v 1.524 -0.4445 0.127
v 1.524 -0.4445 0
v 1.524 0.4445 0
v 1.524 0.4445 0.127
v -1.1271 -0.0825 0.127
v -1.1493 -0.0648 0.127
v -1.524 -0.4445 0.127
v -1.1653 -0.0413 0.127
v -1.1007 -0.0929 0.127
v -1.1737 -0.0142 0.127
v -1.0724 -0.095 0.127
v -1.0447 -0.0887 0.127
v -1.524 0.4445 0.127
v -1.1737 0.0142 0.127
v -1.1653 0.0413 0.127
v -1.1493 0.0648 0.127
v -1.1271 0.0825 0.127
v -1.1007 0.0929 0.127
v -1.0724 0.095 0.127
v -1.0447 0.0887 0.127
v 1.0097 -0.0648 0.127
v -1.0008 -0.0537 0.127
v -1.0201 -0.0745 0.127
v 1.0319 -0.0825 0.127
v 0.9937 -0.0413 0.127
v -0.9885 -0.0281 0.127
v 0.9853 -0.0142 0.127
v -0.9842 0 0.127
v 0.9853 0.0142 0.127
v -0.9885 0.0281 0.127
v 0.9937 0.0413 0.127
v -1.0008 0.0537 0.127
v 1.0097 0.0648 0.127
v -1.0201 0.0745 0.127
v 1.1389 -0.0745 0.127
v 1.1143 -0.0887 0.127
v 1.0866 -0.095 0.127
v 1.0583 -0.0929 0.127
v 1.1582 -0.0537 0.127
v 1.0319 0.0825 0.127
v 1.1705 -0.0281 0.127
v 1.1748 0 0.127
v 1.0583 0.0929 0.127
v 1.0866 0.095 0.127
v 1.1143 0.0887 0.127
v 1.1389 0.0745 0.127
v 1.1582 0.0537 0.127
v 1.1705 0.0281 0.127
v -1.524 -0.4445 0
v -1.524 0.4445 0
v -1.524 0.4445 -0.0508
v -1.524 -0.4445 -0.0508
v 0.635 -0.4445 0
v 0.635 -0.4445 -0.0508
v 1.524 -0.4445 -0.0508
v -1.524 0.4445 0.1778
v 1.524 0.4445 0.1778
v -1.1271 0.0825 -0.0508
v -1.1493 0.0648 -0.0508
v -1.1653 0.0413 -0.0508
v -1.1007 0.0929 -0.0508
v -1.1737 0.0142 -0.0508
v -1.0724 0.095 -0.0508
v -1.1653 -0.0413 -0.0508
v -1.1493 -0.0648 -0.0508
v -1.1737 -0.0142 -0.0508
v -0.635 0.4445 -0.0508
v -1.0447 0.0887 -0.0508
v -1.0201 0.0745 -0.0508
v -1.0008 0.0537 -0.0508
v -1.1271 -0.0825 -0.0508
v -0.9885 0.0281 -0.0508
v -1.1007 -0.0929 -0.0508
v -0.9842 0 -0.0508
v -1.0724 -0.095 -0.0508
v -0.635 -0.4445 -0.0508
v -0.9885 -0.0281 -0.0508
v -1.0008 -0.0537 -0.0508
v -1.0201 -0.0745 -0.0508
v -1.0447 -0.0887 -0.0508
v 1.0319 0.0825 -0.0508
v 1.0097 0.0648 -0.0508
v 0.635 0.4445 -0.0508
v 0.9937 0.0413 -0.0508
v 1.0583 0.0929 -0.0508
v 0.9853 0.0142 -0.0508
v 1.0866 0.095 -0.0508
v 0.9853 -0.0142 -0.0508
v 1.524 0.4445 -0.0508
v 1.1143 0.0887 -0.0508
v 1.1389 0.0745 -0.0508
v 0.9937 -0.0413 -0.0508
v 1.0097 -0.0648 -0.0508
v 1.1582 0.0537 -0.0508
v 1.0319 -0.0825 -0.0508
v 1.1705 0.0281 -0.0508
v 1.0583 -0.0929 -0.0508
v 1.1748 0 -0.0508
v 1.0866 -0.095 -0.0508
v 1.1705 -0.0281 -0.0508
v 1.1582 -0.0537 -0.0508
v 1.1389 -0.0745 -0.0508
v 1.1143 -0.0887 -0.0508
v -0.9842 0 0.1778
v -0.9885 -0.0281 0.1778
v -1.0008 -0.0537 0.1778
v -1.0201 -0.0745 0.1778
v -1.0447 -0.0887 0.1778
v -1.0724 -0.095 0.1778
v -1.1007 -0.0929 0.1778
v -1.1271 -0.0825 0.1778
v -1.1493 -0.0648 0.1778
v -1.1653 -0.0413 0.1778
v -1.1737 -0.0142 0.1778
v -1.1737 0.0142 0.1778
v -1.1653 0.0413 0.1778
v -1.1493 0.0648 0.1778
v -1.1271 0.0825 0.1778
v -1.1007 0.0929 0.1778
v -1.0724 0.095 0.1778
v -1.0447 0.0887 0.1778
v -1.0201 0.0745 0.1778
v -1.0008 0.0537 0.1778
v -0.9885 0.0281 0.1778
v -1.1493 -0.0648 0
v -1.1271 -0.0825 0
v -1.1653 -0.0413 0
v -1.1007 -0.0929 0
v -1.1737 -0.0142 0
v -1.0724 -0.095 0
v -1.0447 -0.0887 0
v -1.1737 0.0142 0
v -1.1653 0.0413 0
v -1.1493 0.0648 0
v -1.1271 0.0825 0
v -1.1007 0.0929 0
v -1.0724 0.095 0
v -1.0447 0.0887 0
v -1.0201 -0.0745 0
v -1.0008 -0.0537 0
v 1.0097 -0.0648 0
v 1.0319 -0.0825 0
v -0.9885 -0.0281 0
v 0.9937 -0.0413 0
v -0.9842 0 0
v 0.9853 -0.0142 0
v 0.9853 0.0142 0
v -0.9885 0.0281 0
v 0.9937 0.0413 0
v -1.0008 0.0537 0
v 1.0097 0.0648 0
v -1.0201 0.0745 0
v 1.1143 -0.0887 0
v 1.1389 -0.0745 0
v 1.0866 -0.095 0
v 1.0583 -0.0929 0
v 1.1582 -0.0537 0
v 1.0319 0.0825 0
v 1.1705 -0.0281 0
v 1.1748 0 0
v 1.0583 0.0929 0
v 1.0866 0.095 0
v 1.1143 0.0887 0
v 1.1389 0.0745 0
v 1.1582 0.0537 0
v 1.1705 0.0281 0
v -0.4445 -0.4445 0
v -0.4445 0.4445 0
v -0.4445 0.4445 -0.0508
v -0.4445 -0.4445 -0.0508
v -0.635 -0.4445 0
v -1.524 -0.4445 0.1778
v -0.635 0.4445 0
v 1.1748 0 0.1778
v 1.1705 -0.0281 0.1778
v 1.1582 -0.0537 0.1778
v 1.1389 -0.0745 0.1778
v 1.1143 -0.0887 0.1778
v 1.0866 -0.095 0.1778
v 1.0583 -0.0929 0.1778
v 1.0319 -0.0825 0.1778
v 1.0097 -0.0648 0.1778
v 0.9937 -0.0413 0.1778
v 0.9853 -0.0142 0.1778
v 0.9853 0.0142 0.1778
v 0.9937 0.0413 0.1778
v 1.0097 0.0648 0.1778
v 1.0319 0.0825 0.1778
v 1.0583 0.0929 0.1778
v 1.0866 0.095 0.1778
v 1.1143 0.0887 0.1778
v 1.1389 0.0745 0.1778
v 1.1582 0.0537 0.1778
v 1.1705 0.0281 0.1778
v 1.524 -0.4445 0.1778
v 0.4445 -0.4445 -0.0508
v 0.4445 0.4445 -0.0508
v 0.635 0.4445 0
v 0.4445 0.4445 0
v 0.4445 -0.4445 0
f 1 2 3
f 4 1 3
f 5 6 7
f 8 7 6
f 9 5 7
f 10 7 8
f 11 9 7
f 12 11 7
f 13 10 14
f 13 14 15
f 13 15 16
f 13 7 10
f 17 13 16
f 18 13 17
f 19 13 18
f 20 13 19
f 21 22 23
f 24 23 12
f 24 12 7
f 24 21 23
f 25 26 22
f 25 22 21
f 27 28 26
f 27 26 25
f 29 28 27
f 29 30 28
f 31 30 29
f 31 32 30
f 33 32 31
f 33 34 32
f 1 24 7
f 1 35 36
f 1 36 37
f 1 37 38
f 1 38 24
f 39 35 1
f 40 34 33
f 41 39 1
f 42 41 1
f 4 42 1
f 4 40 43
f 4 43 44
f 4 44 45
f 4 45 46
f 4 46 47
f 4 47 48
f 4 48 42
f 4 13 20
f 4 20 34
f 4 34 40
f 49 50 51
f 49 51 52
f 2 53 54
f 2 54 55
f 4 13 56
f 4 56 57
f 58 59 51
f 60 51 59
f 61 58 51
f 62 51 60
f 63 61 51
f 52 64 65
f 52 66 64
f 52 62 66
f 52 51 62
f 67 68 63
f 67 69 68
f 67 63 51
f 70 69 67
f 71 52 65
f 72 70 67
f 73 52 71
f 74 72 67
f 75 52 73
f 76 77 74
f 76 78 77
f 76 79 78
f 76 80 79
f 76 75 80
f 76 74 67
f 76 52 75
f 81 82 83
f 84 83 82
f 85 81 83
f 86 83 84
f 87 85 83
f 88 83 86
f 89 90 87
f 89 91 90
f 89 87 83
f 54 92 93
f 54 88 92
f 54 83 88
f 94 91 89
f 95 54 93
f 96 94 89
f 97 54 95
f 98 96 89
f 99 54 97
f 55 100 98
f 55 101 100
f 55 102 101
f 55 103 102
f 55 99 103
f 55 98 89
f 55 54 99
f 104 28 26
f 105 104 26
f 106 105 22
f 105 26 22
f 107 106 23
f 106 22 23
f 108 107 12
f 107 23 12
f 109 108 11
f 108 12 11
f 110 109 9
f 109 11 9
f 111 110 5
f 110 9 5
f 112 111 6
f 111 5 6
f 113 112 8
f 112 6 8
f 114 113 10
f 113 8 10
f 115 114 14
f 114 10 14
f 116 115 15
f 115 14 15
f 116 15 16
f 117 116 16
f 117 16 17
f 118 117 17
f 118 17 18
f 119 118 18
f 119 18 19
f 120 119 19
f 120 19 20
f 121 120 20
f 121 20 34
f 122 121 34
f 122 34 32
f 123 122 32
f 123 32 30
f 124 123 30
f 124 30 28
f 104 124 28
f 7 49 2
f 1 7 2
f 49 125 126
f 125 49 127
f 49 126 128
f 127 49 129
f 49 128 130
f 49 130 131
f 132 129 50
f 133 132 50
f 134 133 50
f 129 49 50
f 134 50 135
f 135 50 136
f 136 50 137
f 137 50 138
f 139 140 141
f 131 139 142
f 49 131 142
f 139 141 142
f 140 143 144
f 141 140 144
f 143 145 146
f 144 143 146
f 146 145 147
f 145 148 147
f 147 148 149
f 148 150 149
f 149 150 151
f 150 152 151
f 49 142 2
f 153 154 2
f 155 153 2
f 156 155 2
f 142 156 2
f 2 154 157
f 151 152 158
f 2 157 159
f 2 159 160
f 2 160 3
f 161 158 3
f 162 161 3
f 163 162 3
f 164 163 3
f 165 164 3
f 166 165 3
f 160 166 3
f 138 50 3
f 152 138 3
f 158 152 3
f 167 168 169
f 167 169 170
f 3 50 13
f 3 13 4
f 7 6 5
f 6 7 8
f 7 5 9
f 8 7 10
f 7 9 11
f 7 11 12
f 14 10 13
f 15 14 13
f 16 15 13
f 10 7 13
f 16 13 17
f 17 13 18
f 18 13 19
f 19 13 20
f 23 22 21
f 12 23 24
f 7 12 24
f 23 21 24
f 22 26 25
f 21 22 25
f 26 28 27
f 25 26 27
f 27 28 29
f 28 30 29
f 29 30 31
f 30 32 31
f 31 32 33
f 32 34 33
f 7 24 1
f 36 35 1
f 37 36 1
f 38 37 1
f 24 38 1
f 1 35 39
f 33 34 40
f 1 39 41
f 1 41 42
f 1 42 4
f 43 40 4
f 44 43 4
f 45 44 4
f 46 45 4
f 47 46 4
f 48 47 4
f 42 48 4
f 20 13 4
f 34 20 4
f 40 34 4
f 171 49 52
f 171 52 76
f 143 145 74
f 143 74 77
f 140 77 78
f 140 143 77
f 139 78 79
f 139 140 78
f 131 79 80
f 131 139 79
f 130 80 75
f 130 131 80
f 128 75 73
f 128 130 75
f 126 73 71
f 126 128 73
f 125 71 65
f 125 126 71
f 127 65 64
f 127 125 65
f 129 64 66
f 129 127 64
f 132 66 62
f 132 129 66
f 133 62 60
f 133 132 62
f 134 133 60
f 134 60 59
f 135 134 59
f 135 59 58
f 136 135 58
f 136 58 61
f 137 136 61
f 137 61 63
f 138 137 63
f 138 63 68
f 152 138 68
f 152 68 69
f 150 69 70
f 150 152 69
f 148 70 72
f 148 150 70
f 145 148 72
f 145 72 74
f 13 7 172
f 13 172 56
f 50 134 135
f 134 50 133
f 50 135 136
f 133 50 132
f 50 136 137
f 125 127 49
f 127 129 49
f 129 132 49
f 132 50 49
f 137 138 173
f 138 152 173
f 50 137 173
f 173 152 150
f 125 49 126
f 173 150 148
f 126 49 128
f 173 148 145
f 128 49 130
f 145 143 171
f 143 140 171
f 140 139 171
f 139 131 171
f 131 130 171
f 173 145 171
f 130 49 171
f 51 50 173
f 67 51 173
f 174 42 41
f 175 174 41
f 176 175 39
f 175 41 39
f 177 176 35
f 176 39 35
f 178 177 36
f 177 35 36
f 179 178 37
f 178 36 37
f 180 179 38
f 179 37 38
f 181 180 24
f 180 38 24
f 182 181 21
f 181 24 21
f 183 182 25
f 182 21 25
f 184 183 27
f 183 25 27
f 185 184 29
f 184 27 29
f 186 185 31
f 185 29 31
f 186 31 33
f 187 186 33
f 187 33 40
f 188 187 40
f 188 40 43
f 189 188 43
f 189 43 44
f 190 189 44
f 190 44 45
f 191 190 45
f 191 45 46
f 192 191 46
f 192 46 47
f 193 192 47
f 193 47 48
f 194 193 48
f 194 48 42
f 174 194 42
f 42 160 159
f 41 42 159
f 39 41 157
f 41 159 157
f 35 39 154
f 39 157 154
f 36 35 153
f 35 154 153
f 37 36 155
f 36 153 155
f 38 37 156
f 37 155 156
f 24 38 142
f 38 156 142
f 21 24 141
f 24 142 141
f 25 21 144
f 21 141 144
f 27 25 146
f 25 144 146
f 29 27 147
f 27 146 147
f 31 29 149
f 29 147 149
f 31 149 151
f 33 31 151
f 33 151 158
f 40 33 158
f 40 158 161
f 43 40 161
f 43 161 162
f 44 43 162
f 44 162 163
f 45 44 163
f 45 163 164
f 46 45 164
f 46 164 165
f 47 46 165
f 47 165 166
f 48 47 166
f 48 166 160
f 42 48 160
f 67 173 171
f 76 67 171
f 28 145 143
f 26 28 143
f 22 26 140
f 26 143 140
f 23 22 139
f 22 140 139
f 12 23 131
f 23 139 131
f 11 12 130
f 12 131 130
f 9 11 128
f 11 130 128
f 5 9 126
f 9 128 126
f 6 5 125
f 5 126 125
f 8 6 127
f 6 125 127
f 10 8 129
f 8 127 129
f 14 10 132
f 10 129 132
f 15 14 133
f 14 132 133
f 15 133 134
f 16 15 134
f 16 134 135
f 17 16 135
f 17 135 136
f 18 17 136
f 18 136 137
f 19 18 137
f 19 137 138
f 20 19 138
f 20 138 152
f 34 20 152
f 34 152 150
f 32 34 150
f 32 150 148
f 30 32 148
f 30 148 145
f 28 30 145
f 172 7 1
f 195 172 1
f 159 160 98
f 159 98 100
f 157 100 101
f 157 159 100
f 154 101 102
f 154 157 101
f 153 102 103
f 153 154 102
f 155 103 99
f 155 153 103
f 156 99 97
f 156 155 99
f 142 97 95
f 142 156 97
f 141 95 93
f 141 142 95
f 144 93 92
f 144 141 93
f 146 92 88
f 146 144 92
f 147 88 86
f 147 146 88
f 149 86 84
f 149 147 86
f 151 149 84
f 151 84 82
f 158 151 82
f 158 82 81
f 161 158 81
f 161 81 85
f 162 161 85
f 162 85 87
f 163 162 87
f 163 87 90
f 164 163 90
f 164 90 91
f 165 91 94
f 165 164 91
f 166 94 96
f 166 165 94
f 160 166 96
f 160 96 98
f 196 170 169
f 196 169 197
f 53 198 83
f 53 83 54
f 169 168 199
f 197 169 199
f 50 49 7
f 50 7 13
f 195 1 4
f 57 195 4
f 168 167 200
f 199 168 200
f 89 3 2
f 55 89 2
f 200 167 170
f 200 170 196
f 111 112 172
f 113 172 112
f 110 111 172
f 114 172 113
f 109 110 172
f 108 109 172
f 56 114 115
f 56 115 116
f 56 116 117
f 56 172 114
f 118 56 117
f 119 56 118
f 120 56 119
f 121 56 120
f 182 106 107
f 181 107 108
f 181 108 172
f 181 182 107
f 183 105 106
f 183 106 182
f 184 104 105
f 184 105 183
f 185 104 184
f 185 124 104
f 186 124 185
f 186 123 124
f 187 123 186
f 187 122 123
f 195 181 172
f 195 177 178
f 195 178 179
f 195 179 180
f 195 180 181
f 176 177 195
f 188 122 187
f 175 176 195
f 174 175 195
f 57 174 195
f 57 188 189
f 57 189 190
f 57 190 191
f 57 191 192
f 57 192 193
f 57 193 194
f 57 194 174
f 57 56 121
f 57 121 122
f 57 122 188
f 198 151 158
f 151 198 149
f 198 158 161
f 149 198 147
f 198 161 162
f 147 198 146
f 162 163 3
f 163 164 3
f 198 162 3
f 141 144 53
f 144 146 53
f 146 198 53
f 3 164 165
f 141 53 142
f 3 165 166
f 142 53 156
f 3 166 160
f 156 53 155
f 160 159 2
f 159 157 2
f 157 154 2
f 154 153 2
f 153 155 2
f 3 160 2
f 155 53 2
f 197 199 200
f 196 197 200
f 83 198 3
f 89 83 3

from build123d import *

# Parameters (mm, degrees)
F0_W     = 3.048
F0_H     = 0.889
F1_DEPTH = 0.127
F2_W     = 3.048
F2_H     = 0.889
F3_DEPTH = 0.0508
F4_W     = 0.889
F4_H     = 0.889
F4_R     = 0.09525
F5_DEPTH = 0.0508
F6_R     = 0.09525
F7_DEPTH = 0.1788


with BuildPart() as f1:
    # F0 (on Top) → F1 (new body)
    with BuildSketch(Plane.XY):
        Rectangle(F0_W, F0_H)
    extrude(amount=F1_DEPTH)


with BuildPart() as f3:
    # F2 (on face) → F3 (new body)
    with BuildSketch(Plane.XY.offset(0.127)):
        Rectangle(F2_W, F2_H)
    extrude(amount=F3_DEPTH)


with BuildPart() as f5:
    # F4 (on face) → F5 (new body)
    with BuildSketch(Plane(origin=(0, 0, 0), x_dir=(1, 0, 0), z_dir=(0, 0, -1))):
        with Locations((-1.0795, 0)):
            Rectangle(F4_W, F4_H)
        with Locations((-1.0795, 0)):
            Circle(F4_R, mode=Mode.SUBTRACT)
        Rectangle(F4_W, F4_H)
        with Locations((1.0795, 0)):
            Rectangle(F4_W, F4_H)
        with Locations((1.0795, 0)):
            Circle(F4_R, mode=Mode.SUBTRACT)
    extrude(amount=F5_DEPTH)


with BuildPart() as f7_tool:
    # F6 (on face) → F7 (new body, through all)
    with BuildSketch(Plane(origin=(0, 0, 0), x_dir=(1, 0, 0), z_dir=(0, 0, -1))):
        with Locations((-1.0795, 0)):
            Circle(F6_R)
        with Locations((1.0795, 0)):
            Circle(F6_R)
    extrude(amount=-F7_DEPTH)


with BuildPart() as f1_1:
    add(f1.part)

    # F7: cut by f7_tool
    add(f7_tool.part, mode=Mode.SUBTRACT)


with BuildPart() as f3_1:
    add(f3.part)

    # F7: cut by f7_tool
    add(f7_tool.part, mode=Mode.SUBTRACT)


solid = Compound([f5.part, f1_1.part, f3_1.part])
